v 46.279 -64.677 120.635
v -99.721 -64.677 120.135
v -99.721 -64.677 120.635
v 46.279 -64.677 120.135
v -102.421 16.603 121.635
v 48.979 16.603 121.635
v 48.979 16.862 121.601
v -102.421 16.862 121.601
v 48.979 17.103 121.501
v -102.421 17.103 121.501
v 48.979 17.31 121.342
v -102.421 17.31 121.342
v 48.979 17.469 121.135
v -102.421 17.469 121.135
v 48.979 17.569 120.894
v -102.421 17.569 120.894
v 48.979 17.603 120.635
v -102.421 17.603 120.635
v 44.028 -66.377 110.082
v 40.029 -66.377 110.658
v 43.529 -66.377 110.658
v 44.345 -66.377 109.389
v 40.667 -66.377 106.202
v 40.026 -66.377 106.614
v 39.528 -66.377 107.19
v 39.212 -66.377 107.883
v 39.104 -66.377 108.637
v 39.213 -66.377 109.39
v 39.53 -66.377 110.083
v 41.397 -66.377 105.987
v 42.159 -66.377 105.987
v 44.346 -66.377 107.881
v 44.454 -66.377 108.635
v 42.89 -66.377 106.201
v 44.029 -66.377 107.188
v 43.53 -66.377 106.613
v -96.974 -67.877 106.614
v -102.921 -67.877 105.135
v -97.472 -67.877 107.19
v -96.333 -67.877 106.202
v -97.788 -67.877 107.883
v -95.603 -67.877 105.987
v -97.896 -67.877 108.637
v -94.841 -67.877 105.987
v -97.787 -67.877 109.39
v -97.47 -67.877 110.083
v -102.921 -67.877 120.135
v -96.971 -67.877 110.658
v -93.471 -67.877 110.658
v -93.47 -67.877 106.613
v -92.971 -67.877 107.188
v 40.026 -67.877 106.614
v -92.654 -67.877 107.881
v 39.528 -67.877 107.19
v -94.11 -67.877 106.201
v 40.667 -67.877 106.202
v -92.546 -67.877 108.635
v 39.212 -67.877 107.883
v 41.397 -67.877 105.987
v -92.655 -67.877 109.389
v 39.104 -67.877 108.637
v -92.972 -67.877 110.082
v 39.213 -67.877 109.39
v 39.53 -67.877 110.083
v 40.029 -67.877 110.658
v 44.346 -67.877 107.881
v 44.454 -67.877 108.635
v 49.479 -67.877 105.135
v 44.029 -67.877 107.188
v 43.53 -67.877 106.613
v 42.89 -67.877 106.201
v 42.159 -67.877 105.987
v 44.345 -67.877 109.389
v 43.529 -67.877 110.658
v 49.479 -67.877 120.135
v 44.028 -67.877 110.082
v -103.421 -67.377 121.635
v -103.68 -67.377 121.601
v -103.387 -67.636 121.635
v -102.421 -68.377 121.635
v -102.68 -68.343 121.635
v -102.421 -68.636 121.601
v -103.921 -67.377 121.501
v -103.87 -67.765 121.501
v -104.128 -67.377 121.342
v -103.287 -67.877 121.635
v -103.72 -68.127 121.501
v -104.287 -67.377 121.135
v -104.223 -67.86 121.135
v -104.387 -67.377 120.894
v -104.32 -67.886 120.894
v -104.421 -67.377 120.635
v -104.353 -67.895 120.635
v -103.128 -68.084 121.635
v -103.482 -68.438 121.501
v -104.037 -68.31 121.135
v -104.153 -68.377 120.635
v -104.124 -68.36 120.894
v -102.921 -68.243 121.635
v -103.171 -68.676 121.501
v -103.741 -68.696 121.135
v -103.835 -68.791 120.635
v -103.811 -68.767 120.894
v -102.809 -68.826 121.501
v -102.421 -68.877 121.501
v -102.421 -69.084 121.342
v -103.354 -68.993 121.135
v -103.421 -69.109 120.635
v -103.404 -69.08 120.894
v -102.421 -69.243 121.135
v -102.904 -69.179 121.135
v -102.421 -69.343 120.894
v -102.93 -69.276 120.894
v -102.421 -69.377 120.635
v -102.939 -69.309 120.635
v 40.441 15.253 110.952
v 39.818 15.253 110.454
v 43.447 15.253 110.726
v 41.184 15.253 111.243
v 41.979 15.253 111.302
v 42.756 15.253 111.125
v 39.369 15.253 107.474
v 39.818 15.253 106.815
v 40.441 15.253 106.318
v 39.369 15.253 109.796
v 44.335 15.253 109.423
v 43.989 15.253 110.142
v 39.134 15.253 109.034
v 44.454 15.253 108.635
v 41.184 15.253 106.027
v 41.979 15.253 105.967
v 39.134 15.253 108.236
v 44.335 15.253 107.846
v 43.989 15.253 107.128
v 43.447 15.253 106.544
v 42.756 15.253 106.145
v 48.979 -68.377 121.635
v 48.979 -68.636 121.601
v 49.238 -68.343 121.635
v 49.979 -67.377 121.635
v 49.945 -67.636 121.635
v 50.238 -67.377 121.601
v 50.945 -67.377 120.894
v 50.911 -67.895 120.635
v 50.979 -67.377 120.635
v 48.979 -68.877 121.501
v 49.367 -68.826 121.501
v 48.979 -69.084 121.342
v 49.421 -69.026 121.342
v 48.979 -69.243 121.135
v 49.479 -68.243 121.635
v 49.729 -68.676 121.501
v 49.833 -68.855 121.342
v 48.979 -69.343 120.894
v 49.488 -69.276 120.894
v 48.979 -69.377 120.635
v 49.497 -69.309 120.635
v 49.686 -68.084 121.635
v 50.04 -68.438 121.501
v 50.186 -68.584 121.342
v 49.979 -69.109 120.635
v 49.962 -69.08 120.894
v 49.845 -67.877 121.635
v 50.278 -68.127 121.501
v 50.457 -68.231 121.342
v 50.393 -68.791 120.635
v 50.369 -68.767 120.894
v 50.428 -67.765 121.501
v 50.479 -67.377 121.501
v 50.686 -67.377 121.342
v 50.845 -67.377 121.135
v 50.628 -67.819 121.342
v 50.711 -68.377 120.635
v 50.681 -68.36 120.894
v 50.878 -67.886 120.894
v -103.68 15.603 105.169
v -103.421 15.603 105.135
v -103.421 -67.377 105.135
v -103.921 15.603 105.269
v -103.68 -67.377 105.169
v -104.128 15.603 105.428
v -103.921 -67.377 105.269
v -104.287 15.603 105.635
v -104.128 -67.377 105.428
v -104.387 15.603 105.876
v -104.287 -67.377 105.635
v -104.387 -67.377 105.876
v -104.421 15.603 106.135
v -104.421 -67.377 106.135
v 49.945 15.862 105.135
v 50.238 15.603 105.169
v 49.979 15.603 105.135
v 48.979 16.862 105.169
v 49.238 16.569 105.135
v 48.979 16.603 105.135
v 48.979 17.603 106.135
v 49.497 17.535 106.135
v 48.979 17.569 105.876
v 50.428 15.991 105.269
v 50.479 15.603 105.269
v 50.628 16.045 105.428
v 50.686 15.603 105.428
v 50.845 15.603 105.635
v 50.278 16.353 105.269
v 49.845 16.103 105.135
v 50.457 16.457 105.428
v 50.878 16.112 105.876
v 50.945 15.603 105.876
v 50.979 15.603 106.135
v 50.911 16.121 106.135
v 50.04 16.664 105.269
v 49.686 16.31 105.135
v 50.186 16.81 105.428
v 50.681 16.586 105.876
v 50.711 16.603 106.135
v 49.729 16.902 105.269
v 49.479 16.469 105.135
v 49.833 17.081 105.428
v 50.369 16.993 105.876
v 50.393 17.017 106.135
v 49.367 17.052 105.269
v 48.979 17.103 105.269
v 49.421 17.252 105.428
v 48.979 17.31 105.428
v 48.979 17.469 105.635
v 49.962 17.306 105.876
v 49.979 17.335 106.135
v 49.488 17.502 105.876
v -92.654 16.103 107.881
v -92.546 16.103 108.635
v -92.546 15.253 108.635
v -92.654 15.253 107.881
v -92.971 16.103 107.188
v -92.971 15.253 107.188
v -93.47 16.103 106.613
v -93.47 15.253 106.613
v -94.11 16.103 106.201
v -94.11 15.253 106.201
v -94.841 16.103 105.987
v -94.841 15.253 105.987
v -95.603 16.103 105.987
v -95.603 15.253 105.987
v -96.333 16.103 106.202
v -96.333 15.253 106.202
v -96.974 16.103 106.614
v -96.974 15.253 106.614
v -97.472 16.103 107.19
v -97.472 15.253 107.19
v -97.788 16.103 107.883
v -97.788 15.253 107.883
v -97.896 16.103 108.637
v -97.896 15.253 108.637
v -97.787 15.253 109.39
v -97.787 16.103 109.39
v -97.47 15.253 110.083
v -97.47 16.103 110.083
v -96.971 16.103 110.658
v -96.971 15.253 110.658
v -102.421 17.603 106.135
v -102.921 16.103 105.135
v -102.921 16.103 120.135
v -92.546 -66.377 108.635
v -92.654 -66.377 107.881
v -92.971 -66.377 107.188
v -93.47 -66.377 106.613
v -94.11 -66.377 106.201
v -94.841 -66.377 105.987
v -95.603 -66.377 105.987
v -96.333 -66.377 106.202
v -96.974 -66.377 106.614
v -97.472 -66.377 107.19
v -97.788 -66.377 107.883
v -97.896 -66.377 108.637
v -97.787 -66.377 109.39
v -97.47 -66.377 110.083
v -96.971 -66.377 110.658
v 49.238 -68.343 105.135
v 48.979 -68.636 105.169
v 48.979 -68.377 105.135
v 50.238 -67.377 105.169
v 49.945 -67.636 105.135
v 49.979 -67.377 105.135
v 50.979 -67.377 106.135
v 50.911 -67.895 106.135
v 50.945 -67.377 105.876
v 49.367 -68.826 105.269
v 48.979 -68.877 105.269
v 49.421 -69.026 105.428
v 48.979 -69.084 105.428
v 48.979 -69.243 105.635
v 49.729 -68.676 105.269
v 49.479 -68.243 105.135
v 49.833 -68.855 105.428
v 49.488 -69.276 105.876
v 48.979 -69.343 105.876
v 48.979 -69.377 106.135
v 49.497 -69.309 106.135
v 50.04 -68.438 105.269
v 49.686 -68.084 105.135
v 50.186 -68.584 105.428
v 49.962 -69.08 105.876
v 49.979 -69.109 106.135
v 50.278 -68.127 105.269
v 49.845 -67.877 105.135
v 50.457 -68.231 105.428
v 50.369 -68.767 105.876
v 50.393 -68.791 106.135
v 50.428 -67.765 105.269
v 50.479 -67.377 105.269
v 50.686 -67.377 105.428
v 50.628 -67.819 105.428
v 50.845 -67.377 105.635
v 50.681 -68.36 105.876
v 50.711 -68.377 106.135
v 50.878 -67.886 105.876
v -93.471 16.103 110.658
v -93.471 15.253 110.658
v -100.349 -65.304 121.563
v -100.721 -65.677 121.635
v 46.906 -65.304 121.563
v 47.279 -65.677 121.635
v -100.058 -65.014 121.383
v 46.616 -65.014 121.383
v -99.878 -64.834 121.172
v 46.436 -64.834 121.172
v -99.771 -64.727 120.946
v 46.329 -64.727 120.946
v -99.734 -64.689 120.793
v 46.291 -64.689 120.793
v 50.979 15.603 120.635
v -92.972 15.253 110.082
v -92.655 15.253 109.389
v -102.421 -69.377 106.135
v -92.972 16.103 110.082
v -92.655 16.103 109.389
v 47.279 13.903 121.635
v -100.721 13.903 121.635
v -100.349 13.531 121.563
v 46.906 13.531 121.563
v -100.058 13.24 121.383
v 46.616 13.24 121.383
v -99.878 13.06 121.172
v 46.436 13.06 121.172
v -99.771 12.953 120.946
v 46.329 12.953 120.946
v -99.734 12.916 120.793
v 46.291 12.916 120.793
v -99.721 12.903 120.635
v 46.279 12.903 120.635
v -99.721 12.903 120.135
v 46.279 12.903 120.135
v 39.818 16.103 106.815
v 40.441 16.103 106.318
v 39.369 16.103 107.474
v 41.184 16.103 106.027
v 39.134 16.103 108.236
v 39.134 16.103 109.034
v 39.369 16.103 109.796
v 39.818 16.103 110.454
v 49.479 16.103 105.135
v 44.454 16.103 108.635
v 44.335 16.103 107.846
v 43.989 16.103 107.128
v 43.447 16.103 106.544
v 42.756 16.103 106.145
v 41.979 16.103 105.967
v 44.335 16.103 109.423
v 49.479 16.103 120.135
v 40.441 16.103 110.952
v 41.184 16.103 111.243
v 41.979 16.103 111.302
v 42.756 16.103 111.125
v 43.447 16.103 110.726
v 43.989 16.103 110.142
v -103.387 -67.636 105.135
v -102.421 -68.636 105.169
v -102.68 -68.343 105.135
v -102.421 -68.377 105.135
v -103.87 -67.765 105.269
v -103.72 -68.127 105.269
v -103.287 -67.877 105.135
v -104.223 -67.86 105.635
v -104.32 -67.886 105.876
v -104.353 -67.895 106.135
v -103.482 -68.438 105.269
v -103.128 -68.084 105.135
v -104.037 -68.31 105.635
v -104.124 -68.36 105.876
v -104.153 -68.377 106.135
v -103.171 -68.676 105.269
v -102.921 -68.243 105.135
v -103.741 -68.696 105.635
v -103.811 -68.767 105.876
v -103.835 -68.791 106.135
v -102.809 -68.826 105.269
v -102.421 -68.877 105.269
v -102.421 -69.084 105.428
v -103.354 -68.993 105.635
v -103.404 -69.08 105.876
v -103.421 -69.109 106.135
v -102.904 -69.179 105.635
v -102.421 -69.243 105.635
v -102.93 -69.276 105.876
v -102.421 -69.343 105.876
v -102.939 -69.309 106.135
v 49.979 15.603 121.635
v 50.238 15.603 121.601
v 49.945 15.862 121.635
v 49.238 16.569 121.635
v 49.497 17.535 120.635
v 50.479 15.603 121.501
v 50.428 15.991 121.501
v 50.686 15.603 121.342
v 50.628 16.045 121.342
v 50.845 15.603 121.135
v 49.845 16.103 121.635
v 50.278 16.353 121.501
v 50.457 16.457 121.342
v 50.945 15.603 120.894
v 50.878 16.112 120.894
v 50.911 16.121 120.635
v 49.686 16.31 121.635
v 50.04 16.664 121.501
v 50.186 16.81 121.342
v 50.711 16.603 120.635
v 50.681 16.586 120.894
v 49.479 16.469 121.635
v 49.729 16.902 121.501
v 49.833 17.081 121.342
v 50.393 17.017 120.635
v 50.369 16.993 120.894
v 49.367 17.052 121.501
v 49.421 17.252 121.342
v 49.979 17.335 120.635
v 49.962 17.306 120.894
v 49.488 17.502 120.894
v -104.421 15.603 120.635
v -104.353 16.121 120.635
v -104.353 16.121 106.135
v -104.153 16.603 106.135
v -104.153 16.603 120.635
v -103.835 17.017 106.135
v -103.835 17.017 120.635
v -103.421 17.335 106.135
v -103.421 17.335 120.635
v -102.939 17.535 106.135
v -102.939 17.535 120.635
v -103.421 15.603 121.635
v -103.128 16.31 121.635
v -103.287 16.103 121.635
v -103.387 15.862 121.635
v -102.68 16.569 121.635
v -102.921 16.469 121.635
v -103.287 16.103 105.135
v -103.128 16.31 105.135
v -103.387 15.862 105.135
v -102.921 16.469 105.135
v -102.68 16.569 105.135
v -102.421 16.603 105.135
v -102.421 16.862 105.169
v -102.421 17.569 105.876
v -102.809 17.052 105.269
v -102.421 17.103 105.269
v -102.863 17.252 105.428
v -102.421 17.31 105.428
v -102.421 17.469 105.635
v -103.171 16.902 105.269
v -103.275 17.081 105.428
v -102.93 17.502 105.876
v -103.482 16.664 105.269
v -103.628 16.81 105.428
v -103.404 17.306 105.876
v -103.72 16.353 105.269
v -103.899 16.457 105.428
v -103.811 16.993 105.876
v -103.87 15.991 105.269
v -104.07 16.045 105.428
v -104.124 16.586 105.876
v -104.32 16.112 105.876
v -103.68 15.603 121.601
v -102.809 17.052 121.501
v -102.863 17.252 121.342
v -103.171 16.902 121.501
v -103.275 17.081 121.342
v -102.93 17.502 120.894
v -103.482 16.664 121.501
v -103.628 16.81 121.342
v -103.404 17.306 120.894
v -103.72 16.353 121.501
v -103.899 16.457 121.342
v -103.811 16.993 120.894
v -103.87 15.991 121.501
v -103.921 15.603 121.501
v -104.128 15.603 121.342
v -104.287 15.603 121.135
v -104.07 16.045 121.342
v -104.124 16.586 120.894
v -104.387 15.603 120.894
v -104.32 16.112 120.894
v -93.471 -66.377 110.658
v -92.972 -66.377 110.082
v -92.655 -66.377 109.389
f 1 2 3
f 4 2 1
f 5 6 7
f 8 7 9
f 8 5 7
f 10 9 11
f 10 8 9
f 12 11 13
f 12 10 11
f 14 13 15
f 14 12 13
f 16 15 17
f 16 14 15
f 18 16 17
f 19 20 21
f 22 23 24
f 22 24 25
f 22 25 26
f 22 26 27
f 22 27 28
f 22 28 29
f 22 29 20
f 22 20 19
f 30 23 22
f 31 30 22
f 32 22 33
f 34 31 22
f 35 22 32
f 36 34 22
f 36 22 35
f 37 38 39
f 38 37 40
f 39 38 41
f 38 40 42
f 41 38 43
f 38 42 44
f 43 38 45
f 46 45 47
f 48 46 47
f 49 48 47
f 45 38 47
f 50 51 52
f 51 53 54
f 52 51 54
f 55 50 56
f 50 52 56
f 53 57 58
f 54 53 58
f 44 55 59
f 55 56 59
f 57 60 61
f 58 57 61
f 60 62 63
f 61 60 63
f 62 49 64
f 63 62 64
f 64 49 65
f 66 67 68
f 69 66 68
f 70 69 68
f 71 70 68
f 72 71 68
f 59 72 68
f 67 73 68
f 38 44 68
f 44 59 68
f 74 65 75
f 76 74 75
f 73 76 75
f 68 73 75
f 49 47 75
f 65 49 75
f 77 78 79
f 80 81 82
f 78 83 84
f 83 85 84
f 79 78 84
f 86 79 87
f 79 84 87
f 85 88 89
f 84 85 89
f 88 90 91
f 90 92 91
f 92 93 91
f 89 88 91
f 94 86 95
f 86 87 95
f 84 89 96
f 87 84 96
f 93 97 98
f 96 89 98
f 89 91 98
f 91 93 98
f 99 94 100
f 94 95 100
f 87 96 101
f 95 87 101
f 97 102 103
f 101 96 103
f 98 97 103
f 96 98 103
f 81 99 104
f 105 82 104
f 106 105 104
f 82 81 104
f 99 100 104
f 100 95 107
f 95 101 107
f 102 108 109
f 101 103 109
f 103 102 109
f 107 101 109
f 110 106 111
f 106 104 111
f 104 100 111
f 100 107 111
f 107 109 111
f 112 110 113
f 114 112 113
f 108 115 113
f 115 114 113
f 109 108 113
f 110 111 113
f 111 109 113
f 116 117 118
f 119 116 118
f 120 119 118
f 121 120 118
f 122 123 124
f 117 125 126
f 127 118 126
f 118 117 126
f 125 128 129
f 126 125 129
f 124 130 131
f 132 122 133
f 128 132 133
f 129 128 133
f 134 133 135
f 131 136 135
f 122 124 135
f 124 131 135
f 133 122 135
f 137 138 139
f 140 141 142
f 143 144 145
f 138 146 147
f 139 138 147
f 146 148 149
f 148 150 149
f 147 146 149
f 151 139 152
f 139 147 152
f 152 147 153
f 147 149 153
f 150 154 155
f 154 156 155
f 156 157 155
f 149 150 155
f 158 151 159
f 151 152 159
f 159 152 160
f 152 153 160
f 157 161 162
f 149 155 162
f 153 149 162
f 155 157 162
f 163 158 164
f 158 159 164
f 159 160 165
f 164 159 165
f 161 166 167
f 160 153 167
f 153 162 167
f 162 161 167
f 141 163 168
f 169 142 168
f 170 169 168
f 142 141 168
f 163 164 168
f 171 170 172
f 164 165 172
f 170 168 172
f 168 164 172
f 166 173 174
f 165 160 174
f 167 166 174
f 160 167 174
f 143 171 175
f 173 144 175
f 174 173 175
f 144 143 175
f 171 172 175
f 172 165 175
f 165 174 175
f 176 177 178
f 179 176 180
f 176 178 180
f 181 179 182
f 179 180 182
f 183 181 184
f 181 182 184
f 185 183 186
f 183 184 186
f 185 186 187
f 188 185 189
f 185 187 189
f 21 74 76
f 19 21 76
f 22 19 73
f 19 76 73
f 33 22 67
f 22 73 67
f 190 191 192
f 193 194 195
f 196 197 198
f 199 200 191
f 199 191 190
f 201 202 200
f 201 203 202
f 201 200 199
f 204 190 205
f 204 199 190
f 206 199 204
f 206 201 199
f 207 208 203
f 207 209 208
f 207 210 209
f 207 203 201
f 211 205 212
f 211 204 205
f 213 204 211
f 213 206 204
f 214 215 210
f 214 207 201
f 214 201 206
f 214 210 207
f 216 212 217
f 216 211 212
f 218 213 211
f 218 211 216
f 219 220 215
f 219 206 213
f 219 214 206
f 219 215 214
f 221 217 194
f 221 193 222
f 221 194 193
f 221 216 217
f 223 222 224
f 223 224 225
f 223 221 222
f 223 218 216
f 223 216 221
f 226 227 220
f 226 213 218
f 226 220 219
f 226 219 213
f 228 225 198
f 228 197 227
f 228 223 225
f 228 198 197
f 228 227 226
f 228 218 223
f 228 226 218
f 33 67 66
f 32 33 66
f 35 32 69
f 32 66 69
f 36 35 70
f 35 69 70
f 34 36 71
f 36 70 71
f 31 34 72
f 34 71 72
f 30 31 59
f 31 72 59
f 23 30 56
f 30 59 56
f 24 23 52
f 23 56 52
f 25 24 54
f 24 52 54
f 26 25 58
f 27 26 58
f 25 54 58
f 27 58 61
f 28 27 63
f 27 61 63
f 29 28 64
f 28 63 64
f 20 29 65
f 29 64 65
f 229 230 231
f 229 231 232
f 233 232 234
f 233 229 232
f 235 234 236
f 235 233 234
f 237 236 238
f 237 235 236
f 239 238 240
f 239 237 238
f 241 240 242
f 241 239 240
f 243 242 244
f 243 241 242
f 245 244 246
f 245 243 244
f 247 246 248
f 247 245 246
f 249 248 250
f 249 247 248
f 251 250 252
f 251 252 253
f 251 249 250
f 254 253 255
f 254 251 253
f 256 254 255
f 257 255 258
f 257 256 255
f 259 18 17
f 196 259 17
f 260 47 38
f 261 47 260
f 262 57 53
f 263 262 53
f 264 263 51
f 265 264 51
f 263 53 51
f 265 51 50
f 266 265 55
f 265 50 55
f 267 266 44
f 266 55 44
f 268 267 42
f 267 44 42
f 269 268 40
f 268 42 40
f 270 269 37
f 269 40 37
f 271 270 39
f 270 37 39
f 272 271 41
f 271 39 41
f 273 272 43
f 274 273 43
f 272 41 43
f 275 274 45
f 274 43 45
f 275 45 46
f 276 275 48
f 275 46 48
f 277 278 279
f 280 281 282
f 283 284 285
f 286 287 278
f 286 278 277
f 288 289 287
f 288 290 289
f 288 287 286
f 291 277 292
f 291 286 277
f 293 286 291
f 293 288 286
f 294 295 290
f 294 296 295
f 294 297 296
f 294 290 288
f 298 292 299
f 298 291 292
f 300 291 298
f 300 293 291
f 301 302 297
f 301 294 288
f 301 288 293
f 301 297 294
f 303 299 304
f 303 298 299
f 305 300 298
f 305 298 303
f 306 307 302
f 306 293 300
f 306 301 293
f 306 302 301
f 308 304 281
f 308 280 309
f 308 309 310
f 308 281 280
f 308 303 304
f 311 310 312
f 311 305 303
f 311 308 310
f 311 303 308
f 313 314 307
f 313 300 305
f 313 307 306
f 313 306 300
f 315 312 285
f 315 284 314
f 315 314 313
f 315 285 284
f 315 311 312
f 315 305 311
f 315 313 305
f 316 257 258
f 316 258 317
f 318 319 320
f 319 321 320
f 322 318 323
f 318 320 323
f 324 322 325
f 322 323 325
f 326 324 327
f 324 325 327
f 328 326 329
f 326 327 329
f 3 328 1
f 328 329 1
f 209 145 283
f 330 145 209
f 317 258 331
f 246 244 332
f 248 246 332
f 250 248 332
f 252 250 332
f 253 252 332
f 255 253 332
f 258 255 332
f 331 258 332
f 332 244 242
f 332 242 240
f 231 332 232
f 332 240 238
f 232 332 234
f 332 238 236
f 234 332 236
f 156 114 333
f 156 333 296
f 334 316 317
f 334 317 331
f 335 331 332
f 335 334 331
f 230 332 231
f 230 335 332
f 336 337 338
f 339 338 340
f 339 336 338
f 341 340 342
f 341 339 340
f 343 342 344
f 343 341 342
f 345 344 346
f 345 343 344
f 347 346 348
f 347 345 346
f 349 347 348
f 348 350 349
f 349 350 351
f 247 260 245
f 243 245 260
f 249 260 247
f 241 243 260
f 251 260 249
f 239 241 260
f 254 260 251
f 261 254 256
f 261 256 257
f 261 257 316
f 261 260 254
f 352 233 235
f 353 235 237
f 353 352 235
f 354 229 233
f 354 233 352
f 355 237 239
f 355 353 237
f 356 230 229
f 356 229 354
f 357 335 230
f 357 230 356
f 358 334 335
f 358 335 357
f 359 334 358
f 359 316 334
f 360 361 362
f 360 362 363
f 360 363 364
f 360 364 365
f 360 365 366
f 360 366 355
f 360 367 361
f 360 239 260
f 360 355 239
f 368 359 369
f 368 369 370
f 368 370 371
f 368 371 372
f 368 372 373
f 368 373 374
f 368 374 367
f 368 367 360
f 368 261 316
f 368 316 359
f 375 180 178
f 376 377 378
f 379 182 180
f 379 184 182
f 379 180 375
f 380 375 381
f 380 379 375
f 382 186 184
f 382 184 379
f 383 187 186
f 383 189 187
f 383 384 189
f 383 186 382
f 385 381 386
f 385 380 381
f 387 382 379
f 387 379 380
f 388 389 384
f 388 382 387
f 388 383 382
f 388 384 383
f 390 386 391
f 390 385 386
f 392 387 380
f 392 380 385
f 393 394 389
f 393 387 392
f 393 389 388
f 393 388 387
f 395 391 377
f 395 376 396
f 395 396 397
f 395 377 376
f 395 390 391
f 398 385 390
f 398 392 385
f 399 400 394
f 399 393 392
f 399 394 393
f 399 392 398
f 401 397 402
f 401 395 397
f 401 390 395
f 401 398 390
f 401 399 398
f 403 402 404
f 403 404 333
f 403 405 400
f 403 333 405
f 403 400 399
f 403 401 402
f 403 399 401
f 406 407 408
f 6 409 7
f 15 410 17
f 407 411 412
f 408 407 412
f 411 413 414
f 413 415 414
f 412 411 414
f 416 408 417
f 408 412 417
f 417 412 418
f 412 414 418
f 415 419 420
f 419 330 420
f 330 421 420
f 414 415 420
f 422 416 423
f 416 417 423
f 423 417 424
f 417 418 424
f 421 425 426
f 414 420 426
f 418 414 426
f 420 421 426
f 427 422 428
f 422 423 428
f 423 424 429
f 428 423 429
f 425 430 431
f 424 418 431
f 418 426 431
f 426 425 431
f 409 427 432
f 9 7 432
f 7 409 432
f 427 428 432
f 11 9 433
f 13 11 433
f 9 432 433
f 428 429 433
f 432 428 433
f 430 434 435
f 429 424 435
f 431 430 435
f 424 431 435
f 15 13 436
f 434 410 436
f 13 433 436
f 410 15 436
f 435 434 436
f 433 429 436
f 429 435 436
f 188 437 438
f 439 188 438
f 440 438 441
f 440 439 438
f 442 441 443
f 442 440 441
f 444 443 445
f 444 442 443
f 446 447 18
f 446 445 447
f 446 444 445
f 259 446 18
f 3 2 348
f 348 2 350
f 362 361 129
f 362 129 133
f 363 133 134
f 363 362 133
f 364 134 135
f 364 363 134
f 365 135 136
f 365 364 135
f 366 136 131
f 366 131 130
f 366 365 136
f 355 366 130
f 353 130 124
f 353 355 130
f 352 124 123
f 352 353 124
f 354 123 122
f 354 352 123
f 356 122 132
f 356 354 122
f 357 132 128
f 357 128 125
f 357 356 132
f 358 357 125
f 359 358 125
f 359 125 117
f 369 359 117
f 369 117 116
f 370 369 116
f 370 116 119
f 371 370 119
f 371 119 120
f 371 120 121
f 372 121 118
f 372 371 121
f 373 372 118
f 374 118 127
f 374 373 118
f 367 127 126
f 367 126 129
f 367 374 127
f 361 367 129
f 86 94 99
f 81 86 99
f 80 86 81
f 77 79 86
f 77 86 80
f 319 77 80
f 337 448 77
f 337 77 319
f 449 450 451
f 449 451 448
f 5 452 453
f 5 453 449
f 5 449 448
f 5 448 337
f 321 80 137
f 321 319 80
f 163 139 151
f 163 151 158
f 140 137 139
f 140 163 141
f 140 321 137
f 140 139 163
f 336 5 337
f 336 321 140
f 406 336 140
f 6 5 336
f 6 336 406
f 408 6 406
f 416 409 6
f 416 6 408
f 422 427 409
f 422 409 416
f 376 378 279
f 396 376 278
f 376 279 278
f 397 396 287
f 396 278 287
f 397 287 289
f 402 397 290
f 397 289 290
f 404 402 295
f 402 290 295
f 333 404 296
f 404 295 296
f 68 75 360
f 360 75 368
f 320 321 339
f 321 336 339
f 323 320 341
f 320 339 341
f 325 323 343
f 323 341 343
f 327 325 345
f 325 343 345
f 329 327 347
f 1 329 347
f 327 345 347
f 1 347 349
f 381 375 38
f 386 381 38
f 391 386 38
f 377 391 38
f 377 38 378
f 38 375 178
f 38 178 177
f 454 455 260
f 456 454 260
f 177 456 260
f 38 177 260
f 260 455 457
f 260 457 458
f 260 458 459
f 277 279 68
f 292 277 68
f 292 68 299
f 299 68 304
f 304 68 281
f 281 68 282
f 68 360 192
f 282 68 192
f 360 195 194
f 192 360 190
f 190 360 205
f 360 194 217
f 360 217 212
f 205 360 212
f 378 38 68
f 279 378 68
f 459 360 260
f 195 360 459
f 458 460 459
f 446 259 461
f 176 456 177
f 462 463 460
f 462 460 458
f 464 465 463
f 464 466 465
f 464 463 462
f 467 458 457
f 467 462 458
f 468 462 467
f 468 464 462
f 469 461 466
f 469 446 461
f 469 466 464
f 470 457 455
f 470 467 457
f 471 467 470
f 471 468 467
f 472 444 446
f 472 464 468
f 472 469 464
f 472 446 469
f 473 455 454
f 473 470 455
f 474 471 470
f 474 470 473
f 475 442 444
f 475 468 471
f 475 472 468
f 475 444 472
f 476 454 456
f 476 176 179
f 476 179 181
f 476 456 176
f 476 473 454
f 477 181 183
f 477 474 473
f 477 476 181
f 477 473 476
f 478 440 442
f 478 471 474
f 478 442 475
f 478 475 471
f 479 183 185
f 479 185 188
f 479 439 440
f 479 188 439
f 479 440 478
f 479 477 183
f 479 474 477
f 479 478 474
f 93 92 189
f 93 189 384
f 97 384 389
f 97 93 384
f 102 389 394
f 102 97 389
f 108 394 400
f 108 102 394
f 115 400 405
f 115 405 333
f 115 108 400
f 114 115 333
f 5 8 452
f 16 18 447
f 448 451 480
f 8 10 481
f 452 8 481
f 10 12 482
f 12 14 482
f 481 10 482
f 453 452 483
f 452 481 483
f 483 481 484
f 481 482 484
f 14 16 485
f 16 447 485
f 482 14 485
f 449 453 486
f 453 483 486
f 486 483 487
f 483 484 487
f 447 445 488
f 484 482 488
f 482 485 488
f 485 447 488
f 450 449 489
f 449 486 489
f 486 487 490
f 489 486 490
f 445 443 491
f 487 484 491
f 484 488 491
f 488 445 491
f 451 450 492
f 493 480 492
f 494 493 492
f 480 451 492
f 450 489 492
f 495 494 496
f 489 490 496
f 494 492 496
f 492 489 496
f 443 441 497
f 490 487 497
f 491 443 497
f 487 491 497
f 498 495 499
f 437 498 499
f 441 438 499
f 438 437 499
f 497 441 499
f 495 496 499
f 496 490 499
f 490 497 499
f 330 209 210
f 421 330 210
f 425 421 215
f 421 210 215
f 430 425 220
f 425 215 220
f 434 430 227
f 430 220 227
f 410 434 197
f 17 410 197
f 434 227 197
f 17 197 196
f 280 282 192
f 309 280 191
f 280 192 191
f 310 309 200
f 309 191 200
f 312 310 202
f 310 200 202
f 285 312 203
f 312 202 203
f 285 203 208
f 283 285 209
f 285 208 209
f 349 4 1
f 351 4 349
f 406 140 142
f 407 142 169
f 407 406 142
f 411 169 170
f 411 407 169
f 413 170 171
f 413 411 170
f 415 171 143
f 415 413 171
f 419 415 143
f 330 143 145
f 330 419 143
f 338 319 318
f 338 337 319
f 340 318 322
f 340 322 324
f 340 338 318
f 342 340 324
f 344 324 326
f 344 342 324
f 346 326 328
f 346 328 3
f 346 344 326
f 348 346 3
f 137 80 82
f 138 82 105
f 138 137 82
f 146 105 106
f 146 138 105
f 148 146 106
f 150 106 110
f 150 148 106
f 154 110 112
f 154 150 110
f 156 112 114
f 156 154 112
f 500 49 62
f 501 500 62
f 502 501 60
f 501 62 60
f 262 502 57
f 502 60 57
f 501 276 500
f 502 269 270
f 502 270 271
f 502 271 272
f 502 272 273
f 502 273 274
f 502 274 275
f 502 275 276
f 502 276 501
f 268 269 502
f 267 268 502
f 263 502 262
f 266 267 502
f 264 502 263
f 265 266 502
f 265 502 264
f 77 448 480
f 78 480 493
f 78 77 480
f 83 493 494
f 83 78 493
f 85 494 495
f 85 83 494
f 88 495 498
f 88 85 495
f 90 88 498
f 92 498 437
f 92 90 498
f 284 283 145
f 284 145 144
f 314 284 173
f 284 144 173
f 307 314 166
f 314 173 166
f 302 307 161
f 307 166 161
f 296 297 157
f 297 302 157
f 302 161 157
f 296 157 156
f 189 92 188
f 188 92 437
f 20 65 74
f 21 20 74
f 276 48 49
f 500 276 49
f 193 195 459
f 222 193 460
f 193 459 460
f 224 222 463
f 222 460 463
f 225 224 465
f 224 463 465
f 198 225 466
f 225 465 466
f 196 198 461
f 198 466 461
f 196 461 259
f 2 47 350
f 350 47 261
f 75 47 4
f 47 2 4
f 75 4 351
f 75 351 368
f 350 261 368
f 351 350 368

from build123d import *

# Parameters (mm, degrees)
SKETCH1_W           = 155.4
SKETCH1_H           = 86.98
SKETCH1_W_2         = 152.4
SKETCH1_H_2         = 83.98
SKETCH1_W_3         = 146
SKETCH1_H_3         = 77.58
BOSS_EXTRUDE1_DEPTH = 1.5
SKETCH1_3_W         = 155.4
SKETCH1_3_H         = 86.98
SKETCH1_3_W_2       = 152.4
SKETCH1_3_H_2       = 83.98
BOSS_EXTRUDE2_DEPTH = 15
FILLET1_R           = 2
FILLET2_R           = 1
BOSS_EXTRUDE3_DEPTH = 1.5
BOSS_EXTRUDE4_START = 83.98
SKETCH2_3_R         = 2.675
BOSS_EXTRUDE4_DEPTH = 0.85


with BuildPart() as part:
    # Sketch1 → Boss-Extrude1 (new body)
    with BuildSketch(Plane.XY.offset(120.134907759)):
        with Locations((-26.721041987, -25.88696544)):
            Rectangle(SKETCH1_W, SKETCH1_H)
        with Locations((-26.721041987, -25.88696544)):
            Rectangle(SKETCH1_W_2, SKETCH1_H_2, mode=Mode.SUBTRACT)
        with Locations((-26.721041987, -25.88696544)):
            Rectangle(SKETCH1_W_2, SKETCH1_H_2)
        with Locations((-26.721041987, -25.88696544)):
            Rectangle(SKETCH1_W_3, SKETCH1_H_3, mode=Mode.SUBTRACT)
    extrude(amount=BOSS_EXTRUDE1_DEPTH)

    # Sketch1<3> → Boss-Extrude2 (add)
    with BuildSketch(Plane.XY.offset(120.134907759)):
        with Locations((-26.721041987, -25.88696544)):
            Rectangle(SKETCH1_3_W, SKETCH1_3_H)
        with Locations((-26.721041987, -25.88696544)):
            Rectangle(SKETCH1_3_W_2, SKETCH1_3_H_2, mode=Mode.SUBTRACT)
    extrude(amount=-BOSS_EXTRUDE2_DEPTH)

    # Fillet1
    fillet1_edges = [part.edges().sort_by_distance(p)[0] for p in [
        (50.978958013, -69.37696544, 113.384907759),
        (-104.421041987, -69.37696544, 113.384907759),
        (-104.421041987, 17.60303456, 113.384907759),
        (50.978958013, 17.60303456, 113.384907759),
    ]]
    fillet(fillet1_edges, radius=FILLET1_R)

    # Fillet2
    fillet2_edges = [part.edges().sort_by_distance(p)[0] for p in [
        (-26.721041987, -64.67696544, 121.634907759),
        (-99.721041987, -25.88696544, 121.634907759),
        (-26.721041987, 12.90303456, 121.634907759),
        (46.278958013, -25.88696544, 121.634907759),
        (-26.721041987, -69.37696544, 105.134907759),
        (-26.721041987, -69.37696544, 121.634907759),
        (50.978958013, -25.88696544, 105.134907759),
        (-104.421041987, -25.88696544, 105.134907759),
        (-26.721041987, 17.60303456, 105.134907759),
        (50.393171575, -68.791179003, 105.134907759),
        (50.393171575, 17.017248122, 105.134907759),
        (-103.835255549, 17.017248122, 105.134907759),
        (-103.835255549, -68.791179003, 105.134907759),
        (-104.421041987, -25.88696544, 121.634907759),
        (50.978958013, -25.88696544, 121.634907759),
        (-26.721041987, 17.60303456, 121.634907759),
        (50.393171575, -68.791179003, 121.634907759),
        (50.393171575, 17.017248122, 121.634907759),
        (-103.835255549, 17.017248122, 121.634907759),
        (-103.835255549, -68.791179003, 121.634907759),
    ]]
    fillet(fillet2_edges, radius=FILLET2_R)

    # Sketch2 → Boss-Extrude3 (add)
    with BuildSketch(Plane(origin=(0, -67.87696544, 0), x_dir=(1, 0, 0), z_dir=(0, 1, 0))):
        with BuildLine():
            Line((-96.971041987, -110.65805506), (-93.471041987, -110.65805506))
            ThreePointArc((-93.471041987, -110.65805506), (-92.788258088, -109.747197065), (-92.546041987, -108.634907759))
            ThreePointArc((-92.546041987, -108.634907759), (-96.333331293, -106.20212386), (-96.971041987, -110.65805506))
        make_face()
        with BuildLine():
            Line((40.028958013, -110.65805506), (43.528958013, -110.65805506))
            ThreePointArc((43.528958013, -110.65805506), (44.211741912, -109.747197065), (44.453958013, -108.634907759))
            ThreePointArc((44.453958013, -108.634907759), (40.666668707, -106.20212386), (40.028958013, -110.65805506))
        make_face()
    extrude(amount=BOSS_EXTRUDE3_DEPTH)

    # Sketch2<3> → Boss-Extrude4 (add)
    with BuildSketch(Plane(origin=(0, -67.87696544, 0), x_dir=(1, 0, 0), z_dir=(0, 1, 0)).offset(BOSS_EXTRUDE4_START)):
        with BuildLine():
            Line((-96.971041987, -110.65805506), (-93.471041987, -110.65805506))
            ThreePointArc((-93.471041987, -110.65805506), (-92.788258088, -109.747197065), (-92.546041987, -108.634907759))
            ThreePointArc((-92.546041987, -108.634907759), (-96.333331293, -106.20212386), (-96.971041987, -110.65805506))
        make_face()
        with Locations((41.778958013, -108.634907759)):
            Circle(SKETCH2_3_R)
    extrude(amount=-BOSS_EXTRUDE4_DEPTH)


solid = part.part
